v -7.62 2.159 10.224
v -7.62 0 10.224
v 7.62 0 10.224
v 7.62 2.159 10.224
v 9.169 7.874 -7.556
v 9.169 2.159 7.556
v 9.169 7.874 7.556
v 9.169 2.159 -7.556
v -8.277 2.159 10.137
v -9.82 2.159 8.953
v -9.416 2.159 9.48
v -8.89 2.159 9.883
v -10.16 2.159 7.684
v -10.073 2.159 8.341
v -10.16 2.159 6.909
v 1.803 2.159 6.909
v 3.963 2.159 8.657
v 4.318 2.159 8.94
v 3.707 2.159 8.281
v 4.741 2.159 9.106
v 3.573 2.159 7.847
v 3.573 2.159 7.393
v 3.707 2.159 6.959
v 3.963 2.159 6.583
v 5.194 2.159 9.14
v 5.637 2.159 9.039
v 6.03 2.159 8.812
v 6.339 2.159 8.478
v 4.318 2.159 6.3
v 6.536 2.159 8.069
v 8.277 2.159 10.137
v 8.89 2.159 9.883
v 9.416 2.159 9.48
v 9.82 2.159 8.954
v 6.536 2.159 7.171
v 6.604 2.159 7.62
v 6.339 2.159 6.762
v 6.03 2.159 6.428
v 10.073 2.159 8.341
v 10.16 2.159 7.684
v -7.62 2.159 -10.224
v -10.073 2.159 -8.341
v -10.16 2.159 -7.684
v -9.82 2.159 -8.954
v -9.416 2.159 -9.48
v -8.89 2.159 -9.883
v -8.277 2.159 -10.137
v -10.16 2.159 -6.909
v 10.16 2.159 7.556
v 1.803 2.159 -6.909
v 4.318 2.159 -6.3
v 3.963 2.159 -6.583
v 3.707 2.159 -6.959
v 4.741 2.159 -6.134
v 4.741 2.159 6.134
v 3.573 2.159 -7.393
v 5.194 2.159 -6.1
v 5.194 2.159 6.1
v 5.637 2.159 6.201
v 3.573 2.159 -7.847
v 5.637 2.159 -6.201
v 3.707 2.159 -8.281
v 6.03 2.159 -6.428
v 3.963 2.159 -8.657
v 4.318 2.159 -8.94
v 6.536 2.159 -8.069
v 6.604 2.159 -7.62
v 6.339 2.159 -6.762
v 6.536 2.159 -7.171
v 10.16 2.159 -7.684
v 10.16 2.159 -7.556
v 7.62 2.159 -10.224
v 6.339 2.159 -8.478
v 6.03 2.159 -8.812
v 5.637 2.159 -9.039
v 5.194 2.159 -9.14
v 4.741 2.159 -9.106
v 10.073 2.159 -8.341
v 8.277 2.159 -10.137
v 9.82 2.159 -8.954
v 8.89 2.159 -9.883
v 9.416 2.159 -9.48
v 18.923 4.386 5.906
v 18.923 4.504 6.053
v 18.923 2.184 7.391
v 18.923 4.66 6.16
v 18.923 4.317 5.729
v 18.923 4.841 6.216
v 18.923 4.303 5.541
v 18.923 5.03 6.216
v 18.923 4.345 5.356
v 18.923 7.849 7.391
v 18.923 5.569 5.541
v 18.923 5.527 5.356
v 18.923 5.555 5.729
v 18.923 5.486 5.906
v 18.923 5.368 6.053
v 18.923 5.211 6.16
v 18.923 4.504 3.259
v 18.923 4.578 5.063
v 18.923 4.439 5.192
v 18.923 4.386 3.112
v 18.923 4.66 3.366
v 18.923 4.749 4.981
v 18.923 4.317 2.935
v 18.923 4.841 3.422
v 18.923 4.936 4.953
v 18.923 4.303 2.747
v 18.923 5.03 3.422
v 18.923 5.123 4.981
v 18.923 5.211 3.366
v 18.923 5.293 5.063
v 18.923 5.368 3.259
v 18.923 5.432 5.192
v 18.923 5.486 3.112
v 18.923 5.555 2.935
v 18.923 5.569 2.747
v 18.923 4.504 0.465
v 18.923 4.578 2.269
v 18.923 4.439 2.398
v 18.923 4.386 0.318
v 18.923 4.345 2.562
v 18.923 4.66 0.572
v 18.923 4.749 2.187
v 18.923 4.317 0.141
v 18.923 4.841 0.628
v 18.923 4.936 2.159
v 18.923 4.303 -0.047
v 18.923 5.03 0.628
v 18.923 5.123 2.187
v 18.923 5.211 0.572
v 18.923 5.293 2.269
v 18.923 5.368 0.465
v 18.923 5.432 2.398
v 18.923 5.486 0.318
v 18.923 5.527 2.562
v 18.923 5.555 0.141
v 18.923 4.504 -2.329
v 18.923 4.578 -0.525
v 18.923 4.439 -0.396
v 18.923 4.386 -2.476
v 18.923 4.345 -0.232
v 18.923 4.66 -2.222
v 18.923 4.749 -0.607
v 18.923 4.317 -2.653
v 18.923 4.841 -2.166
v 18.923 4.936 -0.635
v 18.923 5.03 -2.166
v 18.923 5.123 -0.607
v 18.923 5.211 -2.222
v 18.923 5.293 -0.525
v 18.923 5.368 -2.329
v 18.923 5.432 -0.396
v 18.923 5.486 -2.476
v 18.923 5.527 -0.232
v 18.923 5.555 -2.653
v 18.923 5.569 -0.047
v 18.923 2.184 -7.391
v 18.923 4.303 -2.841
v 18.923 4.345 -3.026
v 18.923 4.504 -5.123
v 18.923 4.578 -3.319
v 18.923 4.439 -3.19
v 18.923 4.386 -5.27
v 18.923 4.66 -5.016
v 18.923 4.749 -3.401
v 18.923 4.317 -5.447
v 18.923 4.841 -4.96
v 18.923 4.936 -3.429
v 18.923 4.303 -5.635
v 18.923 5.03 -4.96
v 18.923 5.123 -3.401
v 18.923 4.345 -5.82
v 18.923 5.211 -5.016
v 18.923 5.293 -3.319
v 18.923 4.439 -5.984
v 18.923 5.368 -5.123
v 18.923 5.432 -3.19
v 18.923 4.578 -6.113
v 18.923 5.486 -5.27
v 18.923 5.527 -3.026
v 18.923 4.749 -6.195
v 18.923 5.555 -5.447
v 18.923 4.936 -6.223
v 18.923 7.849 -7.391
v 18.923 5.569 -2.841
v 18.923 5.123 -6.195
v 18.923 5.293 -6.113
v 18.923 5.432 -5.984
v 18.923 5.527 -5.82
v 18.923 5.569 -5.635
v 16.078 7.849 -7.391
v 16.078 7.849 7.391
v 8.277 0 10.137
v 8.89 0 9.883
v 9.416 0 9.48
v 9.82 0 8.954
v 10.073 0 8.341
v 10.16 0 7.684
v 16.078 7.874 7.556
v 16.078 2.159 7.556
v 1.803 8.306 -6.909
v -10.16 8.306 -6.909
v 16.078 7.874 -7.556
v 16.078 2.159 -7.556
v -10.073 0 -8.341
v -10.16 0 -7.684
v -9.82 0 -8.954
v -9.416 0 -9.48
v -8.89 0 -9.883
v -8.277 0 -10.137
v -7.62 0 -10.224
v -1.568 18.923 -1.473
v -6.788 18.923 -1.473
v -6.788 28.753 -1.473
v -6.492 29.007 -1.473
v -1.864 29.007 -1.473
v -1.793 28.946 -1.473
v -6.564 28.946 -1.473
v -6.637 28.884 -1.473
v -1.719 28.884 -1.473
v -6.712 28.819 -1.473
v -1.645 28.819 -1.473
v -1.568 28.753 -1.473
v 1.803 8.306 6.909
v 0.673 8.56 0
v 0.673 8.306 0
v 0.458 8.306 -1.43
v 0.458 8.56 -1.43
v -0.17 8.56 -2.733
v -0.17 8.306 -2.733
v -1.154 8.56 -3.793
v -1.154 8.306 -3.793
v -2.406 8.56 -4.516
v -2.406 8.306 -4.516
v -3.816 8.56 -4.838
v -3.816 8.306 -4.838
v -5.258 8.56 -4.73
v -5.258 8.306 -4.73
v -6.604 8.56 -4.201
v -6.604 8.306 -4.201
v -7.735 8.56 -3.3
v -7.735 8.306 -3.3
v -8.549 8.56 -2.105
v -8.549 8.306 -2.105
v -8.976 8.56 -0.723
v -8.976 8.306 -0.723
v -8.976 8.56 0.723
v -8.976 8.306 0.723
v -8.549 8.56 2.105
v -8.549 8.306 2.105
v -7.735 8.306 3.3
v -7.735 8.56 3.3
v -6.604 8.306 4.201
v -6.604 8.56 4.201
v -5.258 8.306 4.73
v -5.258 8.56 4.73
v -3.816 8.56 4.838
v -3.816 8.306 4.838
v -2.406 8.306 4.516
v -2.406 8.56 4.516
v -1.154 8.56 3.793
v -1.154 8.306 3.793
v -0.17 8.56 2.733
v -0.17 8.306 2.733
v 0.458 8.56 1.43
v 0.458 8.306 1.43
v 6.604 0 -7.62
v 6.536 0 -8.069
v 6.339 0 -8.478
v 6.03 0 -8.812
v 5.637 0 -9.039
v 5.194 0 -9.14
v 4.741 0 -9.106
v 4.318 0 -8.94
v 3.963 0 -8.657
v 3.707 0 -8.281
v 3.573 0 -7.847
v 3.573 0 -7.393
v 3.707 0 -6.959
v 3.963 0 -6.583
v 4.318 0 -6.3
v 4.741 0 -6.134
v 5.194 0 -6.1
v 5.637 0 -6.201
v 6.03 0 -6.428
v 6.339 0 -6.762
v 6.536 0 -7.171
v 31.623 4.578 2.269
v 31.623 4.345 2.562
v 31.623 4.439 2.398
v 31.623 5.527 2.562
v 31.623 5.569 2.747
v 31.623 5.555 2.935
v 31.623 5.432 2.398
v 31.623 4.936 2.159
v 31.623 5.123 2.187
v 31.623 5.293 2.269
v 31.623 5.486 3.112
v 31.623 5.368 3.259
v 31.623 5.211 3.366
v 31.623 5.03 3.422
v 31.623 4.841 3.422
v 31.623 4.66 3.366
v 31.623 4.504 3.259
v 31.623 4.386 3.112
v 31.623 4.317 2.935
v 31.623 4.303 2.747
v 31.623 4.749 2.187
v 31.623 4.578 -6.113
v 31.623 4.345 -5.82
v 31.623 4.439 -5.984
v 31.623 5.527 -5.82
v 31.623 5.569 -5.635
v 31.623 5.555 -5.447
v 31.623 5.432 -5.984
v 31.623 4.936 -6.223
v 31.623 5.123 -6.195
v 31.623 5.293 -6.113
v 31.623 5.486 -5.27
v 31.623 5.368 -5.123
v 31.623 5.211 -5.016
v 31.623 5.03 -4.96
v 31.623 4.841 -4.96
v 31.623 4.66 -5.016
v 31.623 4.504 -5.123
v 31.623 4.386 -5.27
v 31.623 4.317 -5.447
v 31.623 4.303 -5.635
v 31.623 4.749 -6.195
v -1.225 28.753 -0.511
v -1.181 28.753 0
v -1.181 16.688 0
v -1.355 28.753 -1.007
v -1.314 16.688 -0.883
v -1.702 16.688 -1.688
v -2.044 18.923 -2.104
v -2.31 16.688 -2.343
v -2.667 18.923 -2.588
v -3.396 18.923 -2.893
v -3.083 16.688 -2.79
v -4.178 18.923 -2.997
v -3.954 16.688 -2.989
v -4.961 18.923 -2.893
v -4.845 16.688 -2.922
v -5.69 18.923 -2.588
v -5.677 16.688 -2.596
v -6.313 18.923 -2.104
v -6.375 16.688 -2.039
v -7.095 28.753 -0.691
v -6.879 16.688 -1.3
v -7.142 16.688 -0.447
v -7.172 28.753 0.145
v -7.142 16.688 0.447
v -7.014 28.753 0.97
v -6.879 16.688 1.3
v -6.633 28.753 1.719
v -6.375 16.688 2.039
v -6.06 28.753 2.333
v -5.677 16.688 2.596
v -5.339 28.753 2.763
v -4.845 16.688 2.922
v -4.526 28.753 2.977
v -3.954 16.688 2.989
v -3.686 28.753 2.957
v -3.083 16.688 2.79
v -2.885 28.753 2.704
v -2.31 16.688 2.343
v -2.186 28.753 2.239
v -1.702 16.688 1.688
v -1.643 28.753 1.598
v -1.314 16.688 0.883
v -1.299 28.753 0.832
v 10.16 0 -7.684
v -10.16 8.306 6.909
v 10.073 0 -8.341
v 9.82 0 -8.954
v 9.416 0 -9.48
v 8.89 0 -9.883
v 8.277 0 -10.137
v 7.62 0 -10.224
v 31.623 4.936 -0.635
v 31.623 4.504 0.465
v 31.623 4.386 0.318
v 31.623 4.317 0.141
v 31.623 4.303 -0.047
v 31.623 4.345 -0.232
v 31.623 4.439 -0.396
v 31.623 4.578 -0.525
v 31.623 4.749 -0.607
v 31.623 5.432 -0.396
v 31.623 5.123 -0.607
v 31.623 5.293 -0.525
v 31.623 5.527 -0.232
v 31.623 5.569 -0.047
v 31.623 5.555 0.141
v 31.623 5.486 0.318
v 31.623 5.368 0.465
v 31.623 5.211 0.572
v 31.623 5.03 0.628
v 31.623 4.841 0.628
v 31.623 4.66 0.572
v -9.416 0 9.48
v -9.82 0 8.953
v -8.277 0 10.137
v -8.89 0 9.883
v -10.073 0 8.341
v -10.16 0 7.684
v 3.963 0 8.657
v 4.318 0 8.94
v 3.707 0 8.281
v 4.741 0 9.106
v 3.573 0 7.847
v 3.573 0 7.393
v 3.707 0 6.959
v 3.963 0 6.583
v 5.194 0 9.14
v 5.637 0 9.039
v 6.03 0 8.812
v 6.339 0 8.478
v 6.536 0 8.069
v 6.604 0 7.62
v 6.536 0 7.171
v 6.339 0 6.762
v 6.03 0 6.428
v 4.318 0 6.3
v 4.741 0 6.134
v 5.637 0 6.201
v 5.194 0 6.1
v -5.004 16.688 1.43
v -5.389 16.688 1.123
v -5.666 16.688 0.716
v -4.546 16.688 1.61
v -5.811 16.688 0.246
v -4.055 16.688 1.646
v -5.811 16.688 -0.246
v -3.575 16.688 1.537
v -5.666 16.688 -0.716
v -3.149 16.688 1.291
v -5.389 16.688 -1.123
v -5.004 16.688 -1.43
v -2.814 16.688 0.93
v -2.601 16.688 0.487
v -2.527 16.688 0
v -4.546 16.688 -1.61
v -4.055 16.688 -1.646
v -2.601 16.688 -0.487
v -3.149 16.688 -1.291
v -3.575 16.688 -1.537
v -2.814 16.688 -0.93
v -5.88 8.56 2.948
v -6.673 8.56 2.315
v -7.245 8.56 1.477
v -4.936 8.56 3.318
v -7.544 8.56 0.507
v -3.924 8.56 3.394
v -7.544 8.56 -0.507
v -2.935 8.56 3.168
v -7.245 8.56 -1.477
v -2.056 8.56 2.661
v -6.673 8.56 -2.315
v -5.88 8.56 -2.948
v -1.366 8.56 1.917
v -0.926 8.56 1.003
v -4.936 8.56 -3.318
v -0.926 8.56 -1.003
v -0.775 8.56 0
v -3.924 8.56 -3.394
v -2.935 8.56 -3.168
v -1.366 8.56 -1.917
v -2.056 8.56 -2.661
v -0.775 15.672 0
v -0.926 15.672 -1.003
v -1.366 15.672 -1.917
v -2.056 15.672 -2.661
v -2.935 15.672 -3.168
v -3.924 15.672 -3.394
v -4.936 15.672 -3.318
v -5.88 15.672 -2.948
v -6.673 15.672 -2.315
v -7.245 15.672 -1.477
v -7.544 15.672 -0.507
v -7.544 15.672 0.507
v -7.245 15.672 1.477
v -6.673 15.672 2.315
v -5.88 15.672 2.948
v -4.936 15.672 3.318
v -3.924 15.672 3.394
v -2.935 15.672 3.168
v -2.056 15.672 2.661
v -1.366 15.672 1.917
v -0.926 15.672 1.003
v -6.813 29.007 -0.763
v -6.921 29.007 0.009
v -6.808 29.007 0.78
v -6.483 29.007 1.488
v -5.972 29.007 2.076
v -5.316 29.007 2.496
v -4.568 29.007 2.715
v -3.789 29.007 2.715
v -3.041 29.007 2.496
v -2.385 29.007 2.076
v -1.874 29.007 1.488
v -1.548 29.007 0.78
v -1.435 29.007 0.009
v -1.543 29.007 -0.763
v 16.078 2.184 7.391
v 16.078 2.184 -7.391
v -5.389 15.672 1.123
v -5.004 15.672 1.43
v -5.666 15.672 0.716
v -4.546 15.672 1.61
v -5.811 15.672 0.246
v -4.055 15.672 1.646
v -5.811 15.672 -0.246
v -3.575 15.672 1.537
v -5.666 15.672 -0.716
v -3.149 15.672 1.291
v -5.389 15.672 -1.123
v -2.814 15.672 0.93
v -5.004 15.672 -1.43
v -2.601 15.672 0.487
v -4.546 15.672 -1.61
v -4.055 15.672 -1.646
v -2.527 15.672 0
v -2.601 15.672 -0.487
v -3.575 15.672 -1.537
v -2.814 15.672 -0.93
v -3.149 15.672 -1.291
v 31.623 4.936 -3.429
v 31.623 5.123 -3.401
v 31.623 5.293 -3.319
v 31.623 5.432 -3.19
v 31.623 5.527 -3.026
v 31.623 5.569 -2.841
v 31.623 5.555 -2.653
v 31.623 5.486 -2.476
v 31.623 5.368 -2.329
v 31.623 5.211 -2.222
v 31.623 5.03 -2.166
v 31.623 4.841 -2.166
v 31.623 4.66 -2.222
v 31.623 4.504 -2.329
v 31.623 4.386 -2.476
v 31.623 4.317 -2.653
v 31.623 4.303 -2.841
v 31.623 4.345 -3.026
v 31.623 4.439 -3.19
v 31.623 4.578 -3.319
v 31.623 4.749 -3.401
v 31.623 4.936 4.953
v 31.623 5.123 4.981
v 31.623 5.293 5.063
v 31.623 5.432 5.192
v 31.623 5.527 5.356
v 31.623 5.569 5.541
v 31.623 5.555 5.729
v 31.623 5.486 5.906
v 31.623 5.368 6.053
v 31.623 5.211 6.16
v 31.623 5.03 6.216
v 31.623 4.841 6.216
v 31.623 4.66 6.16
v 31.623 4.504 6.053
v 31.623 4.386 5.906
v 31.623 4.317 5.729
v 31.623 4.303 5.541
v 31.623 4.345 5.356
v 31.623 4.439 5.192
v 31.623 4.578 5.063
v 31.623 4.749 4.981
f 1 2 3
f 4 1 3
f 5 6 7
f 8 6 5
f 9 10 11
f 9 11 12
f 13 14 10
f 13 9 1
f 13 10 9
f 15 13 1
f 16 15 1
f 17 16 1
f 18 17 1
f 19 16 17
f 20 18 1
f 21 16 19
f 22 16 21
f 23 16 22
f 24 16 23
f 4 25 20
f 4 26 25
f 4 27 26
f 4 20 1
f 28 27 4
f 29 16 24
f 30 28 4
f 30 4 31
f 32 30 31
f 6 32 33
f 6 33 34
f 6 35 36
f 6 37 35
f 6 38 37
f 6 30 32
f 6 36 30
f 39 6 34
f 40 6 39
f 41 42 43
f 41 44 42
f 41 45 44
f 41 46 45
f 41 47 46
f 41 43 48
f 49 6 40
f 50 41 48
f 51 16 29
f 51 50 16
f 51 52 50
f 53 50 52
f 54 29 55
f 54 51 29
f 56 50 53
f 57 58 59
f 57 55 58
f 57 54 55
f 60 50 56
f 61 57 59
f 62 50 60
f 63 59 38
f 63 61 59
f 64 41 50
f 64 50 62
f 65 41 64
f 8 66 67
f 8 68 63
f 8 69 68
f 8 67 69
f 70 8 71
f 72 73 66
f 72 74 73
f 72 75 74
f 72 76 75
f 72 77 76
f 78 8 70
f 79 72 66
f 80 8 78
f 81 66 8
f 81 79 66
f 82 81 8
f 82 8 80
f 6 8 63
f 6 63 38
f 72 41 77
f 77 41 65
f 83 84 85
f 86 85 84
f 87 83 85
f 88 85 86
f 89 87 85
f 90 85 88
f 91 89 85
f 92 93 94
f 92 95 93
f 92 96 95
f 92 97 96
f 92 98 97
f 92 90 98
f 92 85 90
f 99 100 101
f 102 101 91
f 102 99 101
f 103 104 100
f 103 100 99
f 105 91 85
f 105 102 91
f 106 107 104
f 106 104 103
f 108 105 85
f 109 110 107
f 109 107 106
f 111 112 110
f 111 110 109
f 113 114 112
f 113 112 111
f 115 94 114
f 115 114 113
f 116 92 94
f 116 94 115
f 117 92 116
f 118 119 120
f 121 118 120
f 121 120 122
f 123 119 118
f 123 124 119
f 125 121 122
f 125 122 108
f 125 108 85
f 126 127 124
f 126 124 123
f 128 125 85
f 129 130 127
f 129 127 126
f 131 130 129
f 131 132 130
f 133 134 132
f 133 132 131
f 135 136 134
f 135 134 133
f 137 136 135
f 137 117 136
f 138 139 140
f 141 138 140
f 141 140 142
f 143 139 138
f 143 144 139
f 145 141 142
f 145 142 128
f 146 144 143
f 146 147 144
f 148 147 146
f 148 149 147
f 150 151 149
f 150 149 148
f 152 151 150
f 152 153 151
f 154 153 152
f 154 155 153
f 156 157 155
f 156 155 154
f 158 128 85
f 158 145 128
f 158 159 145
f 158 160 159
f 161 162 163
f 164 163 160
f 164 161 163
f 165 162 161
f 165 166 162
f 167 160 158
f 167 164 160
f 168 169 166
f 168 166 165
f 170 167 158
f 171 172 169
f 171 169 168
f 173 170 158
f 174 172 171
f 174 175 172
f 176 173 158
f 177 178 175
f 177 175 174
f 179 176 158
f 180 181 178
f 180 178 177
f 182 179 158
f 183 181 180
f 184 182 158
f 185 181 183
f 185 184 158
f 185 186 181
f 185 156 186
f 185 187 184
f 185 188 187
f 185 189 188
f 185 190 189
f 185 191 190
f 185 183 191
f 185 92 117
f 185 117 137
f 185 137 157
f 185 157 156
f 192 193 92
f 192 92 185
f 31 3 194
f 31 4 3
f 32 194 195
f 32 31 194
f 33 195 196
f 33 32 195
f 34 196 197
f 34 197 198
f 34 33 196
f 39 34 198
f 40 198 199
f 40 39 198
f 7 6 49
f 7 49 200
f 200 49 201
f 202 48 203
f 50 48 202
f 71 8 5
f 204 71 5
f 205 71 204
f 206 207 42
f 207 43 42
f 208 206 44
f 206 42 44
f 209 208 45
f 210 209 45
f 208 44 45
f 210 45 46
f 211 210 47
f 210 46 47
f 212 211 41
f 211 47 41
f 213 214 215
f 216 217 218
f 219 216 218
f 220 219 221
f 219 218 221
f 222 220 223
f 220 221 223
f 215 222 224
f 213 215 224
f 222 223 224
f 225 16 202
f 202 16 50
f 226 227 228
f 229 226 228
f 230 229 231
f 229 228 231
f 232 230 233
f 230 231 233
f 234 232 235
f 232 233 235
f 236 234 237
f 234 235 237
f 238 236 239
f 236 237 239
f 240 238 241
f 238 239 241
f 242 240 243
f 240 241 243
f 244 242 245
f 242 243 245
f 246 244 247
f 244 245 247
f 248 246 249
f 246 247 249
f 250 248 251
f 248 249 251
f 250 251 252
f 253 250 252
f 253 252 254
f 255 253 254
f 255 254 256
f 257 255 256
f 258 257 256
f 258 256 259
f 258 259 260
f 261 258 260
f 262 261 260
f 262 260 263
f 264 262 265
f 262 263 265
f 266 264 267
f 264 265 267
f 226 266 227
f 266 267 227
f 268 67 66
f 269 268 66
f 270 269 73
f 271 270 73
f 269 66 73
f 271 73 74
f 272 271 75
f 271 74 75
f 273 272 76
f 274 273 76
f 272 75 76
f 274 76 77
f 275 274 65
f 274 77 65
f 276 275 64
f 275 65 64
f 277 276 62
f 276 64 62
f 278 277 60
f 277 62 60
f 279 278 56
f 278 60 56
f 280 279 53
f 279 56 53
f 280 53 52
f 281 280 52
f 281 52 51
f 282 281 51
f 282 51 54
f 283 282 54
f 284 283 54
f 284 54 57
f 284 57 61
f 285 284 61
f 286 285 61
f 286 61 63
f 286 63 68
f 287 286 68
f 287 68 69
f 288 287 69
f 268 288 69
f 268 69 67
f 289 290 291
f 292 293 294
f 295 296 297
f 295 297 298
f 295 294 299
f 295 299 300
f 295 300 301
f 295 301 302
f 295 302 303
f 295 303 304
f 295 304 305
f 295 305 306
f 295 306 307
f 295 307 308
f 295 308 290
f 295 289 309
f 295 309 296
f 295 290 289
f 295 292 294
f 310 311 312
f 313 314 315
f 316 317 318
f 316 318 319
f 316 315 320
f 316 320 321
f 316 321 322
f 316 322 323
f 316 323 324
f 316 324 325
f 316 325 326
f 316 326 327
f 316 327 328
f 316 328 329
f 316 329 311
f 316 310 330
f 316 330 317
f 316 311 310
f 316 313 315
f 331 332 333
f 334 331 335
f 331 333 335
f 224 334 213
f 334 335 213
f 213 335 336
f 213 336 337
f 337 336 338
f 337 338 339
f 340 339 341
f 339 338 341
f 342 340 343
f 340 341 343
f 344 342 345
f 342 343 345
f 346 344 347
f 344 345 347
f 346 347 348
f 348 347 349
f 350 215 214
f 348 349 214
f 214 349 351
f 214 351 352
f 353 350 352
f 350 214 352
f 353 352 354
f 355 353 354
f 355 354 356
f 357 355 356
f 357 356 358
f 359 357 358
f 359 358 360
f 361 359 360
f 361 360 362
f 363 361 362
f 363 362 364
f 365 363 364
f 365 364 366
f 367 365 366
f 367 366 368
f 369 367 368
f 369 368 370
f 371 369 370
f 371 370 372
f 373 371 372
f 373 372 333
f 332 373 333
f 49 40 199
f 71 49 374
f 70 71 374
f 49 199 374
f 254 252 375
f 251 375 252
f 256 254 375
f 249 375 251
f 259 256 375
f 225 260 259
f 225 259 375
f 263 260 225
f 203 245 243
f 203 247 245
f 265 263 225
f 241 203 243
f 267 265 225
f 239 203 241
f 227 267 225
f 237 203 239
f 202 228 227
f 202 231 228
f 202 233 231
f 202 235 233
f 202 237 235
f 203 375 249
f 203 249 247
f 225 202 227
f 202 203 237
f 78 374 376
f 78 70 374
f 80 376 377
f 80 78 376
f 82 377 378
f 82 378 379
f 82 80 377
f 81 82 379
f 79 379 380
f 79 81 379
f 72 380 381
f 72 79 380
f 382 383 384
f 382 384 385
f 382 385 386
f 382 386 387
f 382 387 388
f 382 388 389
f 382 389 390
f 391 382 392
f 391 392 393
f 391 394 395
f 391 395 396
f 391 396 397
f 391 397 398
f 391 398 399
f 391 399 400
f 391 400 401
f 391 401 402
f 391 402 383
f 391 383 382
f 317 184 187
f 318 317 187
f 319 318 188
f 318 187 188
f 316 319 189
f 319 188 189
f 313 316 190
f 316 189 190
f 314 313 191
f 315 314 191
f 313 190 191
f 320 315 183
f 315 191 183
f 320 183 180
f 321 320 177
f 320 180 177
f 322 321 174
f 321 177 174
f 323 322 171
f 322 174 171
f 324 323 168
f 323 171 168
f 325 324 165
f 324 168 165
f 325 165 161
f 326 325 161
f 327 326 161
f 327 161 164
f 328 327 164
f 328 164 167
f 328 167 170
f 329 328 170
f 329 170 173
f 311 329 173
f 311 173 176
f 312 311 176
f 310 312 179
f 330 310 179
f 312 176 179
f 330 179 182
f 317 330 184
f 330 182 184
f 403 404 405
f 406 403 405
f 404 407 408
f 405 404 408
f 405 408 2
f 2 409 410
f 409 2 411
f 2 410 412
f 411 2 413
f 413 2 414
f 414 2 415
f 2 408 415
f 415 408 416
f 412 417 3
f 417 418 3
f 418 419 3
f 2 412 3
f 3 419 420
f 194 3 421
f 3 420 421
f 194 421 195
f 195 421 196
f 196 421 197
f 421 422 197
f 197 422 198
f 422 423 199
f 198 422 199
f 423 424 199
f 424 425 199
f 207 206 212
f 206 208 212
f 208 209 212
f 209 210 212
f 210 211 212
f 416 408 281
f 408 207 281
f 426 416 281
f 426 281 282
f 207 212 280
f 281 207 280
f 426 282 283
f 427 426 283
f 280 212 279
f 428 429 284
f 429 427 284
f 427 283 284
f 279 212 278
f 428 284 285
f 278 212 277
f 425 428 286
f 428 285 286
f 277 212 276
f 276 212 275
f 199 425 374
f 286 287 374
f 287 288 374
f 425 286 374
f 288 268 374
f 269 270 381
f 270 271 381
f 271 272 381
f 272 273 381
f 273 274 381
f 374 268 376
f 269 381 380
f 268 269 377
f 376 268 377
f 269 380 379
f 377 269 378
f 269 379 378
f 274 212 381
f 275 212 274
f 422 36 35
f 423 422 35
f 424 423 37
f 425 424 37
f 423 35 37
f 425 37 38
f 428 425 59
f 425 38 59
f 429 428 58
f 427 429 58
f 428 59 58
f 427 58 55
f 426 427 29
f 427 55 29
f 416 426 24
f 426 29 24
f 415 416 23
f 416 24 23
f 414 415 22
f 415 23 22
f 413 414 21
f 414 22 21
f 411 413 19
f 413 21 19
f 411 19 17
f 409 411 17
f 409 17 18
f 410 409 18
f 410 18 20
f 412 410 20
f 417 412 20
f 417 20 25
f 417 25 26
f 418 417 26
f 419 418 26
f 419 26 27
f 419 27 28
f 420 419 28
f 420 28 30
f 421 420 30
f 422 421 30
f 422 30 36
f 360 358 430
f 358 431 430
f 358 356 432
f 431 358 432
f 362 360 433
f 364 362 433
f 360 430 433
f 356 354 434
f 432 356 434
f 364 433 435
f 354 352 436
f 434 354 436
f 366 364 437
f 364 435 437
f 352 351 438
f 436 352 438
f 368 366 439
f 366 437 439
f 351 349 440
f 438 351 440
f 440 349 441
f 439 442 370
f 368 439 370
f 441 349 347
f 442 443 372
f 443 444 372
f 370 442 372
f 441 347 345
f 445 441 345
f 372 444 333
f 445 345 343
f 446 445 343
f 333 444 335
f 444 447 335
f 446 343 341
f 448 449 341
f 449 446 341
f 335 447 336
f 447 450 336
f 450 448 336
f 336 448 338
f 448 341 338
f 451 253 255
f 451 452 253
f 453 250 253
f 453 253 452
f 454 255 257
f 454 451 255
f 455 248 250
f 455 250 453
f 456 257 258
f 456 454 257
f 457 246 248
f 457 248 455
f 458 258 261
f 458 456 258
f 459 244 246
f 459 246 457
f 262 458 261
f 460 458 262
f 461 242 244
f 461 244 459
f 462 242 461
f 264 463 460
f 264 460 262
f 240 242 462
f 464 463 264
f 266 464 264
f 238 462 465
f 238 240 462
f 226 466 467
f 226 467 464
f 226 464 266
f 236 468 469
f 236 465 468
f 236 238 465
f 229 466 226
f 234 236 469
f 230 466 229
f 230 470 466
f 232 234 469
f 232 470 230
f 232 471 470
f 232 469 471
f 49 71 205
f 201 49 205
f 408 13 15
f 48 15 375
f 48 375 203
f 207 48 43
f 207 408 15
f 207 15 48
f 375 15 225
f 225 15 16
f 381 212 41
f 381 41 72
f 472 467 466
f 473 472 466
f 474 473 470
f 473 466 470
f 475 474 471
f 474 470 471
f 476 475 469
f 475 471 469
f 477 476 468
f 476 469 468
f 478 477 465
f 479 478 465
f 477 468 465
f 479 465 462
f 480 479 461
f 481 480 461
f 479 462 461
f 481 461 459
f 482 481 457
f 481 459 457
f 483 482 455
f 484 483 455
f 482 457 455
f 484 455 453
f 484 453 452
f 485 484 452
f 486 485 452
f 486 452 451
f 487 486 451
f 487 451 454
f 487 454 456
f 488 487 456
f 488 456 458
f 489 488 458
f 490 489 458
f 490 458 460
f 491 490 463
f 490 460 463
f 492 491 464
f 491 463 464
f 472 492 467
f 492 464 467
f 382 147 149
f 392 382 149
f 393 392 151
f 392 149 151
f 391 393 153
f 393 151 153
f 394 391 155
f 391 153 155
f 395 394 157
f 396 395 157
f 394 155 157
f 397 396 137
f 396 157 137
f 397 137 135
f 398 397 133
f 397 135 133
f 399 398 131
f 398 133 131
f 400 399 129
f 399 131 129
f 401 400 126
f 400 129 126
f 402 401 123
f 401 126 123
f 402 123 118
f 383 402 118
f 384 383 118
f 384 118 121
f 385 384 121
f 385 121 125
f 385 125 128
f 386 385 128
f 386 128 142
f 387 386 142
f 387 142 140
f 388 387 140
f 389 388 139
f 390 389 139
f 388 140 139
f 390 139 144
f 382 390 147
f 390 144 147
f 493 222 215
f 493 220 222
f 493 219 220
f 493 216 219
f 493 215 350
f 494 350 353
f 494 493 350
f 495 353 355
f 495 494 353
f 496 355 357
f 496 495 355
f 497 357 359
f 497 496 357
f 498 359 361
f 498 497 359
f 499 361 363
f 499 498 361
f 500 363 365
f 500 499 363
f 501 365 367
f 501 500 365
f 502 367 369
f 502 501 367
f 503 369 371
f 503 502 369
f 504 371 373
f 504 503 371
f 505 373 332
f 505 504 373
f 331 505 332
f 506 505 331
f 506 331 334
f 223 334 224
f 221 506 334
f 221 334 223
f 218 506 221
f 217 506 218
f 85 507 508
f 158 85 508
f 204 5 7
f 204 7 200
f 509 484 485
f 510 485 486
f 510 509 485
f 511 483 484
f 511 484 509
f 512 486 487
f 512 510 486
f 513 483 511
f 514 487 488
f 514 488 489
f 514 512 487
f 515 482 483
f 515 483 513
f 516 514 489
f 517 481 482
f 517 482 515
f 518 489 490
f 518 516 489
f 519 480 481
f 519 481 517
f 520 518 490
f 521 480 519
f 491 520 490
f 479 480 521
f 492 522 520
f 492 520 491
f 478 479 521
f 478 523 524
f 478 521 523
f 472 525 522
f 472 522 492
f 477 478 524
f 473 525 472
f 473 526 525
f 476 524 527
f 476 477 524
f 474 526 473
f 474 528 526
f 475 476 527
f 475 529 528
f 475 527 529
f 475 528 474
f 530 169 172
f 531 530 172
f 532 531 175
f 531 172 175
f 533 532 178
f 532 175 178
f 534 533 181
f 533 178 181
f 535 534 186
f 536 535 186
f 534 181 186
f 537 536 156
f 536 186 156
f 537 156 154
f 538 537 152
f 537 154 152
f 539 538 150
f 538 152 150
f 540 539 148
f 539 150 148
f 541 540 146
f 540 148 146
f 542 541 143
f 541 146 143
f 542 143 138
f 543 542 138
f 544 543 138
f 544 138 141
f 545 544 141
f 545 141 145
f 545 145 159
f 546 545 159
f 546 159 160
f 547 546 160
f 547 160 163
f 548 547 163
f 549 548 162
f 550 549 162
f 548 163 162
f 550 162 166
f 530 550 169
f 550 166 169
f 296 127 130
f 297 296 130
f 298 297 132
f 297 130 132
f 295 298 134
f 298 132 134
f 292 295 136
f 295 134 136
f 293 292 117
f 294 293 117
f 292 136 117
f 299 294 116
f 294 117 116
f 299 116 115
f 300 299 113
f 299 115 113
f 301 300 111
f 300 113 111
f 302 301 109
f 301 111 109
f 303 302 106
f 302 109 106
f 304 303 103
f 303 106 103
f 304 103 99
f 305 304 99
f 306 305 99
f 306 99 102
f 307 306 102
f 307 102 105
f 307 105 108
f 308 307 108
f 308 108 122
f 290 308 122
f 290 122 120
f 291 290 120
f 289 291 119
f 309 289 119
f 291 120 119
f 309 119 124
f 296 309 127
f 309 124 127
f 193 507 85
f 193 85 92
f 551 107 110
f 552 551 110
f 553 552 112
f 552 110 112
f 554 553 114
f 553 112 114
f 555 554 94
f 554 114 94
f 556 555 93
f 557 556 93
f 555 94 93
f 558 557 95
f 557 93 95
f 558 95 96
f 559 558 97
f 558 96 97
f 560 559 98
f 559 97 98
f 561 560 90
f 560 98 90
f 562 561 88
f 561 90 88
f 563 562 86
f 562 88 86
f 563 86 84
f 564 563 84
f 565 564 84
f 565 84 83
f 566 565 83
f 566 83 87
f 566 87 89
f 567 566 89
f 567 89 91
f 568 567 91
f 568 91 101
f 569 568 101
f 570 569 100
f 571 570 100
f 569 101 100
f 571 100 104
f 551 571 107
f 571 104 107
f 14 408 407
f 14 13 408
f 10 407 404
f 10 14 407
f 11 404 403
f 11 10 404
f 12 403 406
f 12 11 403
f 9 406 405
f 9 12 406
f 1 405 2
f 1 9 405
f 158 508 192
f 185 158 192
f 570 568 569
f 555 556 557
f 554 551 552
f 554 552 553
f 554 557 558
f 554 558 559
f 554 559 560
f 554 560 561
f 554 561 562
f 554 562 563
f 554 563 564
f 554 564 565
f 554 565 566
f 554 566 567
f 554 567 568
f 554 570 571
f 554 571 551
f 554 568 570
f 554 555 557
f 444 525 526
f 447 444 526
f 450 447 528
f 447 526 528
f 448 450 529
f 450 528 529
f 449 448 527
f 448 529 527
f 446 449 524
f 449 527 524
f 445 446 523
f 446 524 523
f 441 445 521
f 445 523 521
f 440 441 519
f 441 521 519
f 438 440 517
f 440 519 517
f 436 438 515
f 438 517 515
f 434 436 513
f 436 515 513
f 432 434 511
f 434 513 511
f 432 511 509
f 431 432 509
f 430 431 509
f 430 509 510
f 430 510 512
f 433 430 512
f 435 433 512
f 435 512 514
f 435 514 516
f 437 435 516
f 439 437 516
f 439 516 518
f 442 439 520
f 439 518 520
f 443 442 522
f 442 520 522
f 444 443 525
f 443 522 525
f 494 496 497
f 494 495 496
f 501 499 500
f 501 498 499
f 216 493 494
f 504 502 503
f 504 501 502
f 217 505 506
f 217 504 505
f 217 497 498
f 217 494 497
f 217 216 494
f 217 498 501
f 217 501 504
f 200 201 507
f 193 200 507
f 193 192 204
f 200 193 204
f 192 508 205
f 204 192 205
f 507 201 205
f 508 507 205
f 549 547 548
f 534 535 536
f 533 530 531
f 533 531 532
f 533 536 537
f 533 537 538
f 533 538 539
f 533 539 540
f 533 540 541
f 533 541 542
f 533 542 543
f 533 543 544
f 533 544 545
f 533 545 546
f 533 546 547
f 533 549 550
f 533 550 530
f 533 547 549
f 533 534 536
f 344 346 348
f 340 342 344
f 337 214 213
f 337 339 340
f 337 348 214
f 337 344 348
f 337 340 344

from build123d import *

# Parameters (mm, degrees)
SKETCH1_W           = 20.32
SKETCH1_H           = 20.447
BOSS_EXTRUDE1_DEPTH = 2.159
FILLET1_R           = 2.54
SKETCH2_W           = 6.9088
SKETCH2_H           = 15.113
BOSS_EXTRUDE2_DEPTH = 5.715
SKETCH3_W           = 11.9634
SKETCH3_H           = 13.8176
BOSS_EXTRUDE3_DEPTH = 6.1468
SKETCH4_R           = 4.8514
BOSS_EXTRUDE4_DEPTH = 0.254
SKETCH5_R           = 3.4036
BOSS_EXTRUDE5_DEPTH = 7.112
SKETCH6_R           = 1.651
BOSS_EXTRUDE6_DEPTH = 1.016
SKETCH7_R           = 2.9972
BOSS_EXTRUDE7_DEPTH = 12.319
CUT_EXTRUDE1_DEPTH  = 10.0838
SKETCH9_W           = 14.7828
SKETCH9_H           = 5.6642
BOSS_EXTRUDE8_DEPTH = 2.8448
SKETCH10_R          = 0.635
BOSS_EXTRUDE9_DEPTH = 12.7
SKETCH11_R          = 1.524
CUT_EXTRUDE2_DEPTH  = 12.7
CHAMFER1_SIZE       = 0.254


with BuildPart() as part:
    # Sketch1 → Boss-Extrude1 (new body)
    with BuildSketch(Plane(origin=(0, 0, 0), x_dir=(1, 0, 0), z_dir=(0, 1, 0))):
        Rectangle(SKETCH1_W, SKETCH1_H)
    extrude(amount=BOSS_EXTRUDE1_DEPTH)

    # Fillet1
    fillet1_edges = [part.edges().sort_by_distance(p)[0] for p in [
        (-10.16, 1.0795, -10.2235),
        (10.16, 1.0795, -10.2235),
        (10.16, 1.0795, 10.2235),
        (-10.16, 1.0795, 10.2235),
    ]]
    fillet(fillet1_edges, radius=FILLET1_R)

    # Sketch2 → Boss-Extrude2 (add)
    with BuildSketch(Plane(origin=(0, 2.159, 0), x_dir=(1, 0, 0), z_dir=(0, 1, 0))):
        with Locations((12.6238, 0)):
            Rectangle(SKETCH2_W, SKETCH2_H)
    extrude(amount=BOSS_EXTRUDE2_DEPTH)

    # Sketch3 → Boss-Extrude3 (add)
    with BuildSketch(Plane(origin=(0, 2.159, 0), x_dir=(1, 0, 0), z_dir=(0, 1, 0))):
        with Locations((-4.1783, 0)):
            Rectangle(SKETCH3_W, SKETCH3_H)
    extrude(amount=BOSS_EXTRUDE3_DEPTH)

    # Sketch4 → Boss-Extrude4 (add)
    with BuildSketch(Plane(origin=(0, 8.3058, 0), x_dir=(1, 0, 0), z_dir=(0, 1, 0))):
        with Locations((-4.1783, 0)):
            Circle(SKETCH4_R)
    extrude(amount=BOSS_EXTRUDE4_DEPTH)

    # Sketch5 → Boss-Extrude5 (add)
    with BuildSketch(Plane(origin=(0, 8.5598, 0), x_dir=(1, 0, 0), z_dir=(0, 1, 0))):
        with Locations((-4.1783, 0)):
            Circle(SKETCH5_R)
    extrude(amount=BOSS_EXTRUDE5_DEPTH)

    # Sketch6 → Boss-Extrude6 (add)
    with BuildSketch(Plane(origin=(0, 15.6718, 0), x_dir=(1, 0, 0), z_dir=(0, 1, 0))):
        with Locations((-4.1783, 0)):
            Circle(SKETCH6_R)
    extrude(amount=BOSS_EXTRUDE6_DEPTH)

    # Sketch7 → Boss-Extrude7 (add)
    with BuildSketch(Plane(origin=(0, 16.6878, 0), x_dir=(1, 0, 0), z_dir=(0, 1, 0))):
        with Locations((-4.1783, 0)):
            Circle(SKETCH7_R)
    extrude(amount=BOSS_EXTRUDE7_DEPTH)

    # Sketch8 → Cut-Extrude1 (cut)
    with BuildSketch(Plane(origin=(0, 29.0068, 0), x_dir=(1, 0, 0), z_dir=(0, 1, 0))):
        with BuildLine():
            Line((-6.78845126, 1.4732), (-1.56814874, 1.4732))
            ThreePointArc((-1.56814874, 1.4732), (-4.1783, 2.9972), (-6.78845126, 1.4732))
        make_face()
    extrude(amount=-CUT_EXTRUDE1_DEPTH, mode=Mode.SUBTRACT)

    # Sketch9 → Boss-Extrude8 (add)
    with BuildSketch(Plane(origin=(16.0782, 0, 0), x_dir=(0, 0, -1), z_dir=(1, 0, 0))):
        with Locations((0, 5.0165)):
            Rectangle(SKETCH9_W, SKETCH9_H)
    extrude(amount=BOSS_EXTRUDE8_DEPTH)

    # Sketch10 → Boss-Extrude9 (add)
    with BuildSketch(Plane(origin=(18.923, 0, 0), x_dir=(0, 0, -1), z_dir=(1, 0, 0))):
        with Locations((0, 4.935778059)):
            Circle(SKETCH10_R)
        with Locations((2.794, 4.935778059)):
            Circle(SKETCH10_R)
        with Locations((5.588, 4.935778059)):
            Circle(SKETCH10_R)
        with Locations((-2.794, 4.935778059)):
            Circle(SKETCH10_R)
        with Locations((-5.588, 4.935778059)):
            Circle(SKETCH10_R)
    extrude(amount=BOSS_EXTRUDE9_DEPTH)

    # Sketch11 → Cut-Extrude2 (cut)
    with BuildSketch(Plane(origin=(0, 2.159, 0), x_dir=(1, 0, 0), z_dir=(0, 1, 0))):
        with Locations((5.08, 7.62)):
            Circle(SKETCH11_R)
        with Locations((5.08, -7.62)):
            Circle(SKETCH11_R)
    extrude(amount=-CUT_EXTRUDE2_DEPTH, mode=Mode.SUBTRACT)

    # Chamfer1
    chamfer1_edges = [part.edges().sort_by_distance(p)[0] for p in [
        (-4.939897822, 29.0068, 2.898823313),
    ]]
    chamfer(chamfer1_edges, length=CHAMFER1_SIZE)


solid = part.part
